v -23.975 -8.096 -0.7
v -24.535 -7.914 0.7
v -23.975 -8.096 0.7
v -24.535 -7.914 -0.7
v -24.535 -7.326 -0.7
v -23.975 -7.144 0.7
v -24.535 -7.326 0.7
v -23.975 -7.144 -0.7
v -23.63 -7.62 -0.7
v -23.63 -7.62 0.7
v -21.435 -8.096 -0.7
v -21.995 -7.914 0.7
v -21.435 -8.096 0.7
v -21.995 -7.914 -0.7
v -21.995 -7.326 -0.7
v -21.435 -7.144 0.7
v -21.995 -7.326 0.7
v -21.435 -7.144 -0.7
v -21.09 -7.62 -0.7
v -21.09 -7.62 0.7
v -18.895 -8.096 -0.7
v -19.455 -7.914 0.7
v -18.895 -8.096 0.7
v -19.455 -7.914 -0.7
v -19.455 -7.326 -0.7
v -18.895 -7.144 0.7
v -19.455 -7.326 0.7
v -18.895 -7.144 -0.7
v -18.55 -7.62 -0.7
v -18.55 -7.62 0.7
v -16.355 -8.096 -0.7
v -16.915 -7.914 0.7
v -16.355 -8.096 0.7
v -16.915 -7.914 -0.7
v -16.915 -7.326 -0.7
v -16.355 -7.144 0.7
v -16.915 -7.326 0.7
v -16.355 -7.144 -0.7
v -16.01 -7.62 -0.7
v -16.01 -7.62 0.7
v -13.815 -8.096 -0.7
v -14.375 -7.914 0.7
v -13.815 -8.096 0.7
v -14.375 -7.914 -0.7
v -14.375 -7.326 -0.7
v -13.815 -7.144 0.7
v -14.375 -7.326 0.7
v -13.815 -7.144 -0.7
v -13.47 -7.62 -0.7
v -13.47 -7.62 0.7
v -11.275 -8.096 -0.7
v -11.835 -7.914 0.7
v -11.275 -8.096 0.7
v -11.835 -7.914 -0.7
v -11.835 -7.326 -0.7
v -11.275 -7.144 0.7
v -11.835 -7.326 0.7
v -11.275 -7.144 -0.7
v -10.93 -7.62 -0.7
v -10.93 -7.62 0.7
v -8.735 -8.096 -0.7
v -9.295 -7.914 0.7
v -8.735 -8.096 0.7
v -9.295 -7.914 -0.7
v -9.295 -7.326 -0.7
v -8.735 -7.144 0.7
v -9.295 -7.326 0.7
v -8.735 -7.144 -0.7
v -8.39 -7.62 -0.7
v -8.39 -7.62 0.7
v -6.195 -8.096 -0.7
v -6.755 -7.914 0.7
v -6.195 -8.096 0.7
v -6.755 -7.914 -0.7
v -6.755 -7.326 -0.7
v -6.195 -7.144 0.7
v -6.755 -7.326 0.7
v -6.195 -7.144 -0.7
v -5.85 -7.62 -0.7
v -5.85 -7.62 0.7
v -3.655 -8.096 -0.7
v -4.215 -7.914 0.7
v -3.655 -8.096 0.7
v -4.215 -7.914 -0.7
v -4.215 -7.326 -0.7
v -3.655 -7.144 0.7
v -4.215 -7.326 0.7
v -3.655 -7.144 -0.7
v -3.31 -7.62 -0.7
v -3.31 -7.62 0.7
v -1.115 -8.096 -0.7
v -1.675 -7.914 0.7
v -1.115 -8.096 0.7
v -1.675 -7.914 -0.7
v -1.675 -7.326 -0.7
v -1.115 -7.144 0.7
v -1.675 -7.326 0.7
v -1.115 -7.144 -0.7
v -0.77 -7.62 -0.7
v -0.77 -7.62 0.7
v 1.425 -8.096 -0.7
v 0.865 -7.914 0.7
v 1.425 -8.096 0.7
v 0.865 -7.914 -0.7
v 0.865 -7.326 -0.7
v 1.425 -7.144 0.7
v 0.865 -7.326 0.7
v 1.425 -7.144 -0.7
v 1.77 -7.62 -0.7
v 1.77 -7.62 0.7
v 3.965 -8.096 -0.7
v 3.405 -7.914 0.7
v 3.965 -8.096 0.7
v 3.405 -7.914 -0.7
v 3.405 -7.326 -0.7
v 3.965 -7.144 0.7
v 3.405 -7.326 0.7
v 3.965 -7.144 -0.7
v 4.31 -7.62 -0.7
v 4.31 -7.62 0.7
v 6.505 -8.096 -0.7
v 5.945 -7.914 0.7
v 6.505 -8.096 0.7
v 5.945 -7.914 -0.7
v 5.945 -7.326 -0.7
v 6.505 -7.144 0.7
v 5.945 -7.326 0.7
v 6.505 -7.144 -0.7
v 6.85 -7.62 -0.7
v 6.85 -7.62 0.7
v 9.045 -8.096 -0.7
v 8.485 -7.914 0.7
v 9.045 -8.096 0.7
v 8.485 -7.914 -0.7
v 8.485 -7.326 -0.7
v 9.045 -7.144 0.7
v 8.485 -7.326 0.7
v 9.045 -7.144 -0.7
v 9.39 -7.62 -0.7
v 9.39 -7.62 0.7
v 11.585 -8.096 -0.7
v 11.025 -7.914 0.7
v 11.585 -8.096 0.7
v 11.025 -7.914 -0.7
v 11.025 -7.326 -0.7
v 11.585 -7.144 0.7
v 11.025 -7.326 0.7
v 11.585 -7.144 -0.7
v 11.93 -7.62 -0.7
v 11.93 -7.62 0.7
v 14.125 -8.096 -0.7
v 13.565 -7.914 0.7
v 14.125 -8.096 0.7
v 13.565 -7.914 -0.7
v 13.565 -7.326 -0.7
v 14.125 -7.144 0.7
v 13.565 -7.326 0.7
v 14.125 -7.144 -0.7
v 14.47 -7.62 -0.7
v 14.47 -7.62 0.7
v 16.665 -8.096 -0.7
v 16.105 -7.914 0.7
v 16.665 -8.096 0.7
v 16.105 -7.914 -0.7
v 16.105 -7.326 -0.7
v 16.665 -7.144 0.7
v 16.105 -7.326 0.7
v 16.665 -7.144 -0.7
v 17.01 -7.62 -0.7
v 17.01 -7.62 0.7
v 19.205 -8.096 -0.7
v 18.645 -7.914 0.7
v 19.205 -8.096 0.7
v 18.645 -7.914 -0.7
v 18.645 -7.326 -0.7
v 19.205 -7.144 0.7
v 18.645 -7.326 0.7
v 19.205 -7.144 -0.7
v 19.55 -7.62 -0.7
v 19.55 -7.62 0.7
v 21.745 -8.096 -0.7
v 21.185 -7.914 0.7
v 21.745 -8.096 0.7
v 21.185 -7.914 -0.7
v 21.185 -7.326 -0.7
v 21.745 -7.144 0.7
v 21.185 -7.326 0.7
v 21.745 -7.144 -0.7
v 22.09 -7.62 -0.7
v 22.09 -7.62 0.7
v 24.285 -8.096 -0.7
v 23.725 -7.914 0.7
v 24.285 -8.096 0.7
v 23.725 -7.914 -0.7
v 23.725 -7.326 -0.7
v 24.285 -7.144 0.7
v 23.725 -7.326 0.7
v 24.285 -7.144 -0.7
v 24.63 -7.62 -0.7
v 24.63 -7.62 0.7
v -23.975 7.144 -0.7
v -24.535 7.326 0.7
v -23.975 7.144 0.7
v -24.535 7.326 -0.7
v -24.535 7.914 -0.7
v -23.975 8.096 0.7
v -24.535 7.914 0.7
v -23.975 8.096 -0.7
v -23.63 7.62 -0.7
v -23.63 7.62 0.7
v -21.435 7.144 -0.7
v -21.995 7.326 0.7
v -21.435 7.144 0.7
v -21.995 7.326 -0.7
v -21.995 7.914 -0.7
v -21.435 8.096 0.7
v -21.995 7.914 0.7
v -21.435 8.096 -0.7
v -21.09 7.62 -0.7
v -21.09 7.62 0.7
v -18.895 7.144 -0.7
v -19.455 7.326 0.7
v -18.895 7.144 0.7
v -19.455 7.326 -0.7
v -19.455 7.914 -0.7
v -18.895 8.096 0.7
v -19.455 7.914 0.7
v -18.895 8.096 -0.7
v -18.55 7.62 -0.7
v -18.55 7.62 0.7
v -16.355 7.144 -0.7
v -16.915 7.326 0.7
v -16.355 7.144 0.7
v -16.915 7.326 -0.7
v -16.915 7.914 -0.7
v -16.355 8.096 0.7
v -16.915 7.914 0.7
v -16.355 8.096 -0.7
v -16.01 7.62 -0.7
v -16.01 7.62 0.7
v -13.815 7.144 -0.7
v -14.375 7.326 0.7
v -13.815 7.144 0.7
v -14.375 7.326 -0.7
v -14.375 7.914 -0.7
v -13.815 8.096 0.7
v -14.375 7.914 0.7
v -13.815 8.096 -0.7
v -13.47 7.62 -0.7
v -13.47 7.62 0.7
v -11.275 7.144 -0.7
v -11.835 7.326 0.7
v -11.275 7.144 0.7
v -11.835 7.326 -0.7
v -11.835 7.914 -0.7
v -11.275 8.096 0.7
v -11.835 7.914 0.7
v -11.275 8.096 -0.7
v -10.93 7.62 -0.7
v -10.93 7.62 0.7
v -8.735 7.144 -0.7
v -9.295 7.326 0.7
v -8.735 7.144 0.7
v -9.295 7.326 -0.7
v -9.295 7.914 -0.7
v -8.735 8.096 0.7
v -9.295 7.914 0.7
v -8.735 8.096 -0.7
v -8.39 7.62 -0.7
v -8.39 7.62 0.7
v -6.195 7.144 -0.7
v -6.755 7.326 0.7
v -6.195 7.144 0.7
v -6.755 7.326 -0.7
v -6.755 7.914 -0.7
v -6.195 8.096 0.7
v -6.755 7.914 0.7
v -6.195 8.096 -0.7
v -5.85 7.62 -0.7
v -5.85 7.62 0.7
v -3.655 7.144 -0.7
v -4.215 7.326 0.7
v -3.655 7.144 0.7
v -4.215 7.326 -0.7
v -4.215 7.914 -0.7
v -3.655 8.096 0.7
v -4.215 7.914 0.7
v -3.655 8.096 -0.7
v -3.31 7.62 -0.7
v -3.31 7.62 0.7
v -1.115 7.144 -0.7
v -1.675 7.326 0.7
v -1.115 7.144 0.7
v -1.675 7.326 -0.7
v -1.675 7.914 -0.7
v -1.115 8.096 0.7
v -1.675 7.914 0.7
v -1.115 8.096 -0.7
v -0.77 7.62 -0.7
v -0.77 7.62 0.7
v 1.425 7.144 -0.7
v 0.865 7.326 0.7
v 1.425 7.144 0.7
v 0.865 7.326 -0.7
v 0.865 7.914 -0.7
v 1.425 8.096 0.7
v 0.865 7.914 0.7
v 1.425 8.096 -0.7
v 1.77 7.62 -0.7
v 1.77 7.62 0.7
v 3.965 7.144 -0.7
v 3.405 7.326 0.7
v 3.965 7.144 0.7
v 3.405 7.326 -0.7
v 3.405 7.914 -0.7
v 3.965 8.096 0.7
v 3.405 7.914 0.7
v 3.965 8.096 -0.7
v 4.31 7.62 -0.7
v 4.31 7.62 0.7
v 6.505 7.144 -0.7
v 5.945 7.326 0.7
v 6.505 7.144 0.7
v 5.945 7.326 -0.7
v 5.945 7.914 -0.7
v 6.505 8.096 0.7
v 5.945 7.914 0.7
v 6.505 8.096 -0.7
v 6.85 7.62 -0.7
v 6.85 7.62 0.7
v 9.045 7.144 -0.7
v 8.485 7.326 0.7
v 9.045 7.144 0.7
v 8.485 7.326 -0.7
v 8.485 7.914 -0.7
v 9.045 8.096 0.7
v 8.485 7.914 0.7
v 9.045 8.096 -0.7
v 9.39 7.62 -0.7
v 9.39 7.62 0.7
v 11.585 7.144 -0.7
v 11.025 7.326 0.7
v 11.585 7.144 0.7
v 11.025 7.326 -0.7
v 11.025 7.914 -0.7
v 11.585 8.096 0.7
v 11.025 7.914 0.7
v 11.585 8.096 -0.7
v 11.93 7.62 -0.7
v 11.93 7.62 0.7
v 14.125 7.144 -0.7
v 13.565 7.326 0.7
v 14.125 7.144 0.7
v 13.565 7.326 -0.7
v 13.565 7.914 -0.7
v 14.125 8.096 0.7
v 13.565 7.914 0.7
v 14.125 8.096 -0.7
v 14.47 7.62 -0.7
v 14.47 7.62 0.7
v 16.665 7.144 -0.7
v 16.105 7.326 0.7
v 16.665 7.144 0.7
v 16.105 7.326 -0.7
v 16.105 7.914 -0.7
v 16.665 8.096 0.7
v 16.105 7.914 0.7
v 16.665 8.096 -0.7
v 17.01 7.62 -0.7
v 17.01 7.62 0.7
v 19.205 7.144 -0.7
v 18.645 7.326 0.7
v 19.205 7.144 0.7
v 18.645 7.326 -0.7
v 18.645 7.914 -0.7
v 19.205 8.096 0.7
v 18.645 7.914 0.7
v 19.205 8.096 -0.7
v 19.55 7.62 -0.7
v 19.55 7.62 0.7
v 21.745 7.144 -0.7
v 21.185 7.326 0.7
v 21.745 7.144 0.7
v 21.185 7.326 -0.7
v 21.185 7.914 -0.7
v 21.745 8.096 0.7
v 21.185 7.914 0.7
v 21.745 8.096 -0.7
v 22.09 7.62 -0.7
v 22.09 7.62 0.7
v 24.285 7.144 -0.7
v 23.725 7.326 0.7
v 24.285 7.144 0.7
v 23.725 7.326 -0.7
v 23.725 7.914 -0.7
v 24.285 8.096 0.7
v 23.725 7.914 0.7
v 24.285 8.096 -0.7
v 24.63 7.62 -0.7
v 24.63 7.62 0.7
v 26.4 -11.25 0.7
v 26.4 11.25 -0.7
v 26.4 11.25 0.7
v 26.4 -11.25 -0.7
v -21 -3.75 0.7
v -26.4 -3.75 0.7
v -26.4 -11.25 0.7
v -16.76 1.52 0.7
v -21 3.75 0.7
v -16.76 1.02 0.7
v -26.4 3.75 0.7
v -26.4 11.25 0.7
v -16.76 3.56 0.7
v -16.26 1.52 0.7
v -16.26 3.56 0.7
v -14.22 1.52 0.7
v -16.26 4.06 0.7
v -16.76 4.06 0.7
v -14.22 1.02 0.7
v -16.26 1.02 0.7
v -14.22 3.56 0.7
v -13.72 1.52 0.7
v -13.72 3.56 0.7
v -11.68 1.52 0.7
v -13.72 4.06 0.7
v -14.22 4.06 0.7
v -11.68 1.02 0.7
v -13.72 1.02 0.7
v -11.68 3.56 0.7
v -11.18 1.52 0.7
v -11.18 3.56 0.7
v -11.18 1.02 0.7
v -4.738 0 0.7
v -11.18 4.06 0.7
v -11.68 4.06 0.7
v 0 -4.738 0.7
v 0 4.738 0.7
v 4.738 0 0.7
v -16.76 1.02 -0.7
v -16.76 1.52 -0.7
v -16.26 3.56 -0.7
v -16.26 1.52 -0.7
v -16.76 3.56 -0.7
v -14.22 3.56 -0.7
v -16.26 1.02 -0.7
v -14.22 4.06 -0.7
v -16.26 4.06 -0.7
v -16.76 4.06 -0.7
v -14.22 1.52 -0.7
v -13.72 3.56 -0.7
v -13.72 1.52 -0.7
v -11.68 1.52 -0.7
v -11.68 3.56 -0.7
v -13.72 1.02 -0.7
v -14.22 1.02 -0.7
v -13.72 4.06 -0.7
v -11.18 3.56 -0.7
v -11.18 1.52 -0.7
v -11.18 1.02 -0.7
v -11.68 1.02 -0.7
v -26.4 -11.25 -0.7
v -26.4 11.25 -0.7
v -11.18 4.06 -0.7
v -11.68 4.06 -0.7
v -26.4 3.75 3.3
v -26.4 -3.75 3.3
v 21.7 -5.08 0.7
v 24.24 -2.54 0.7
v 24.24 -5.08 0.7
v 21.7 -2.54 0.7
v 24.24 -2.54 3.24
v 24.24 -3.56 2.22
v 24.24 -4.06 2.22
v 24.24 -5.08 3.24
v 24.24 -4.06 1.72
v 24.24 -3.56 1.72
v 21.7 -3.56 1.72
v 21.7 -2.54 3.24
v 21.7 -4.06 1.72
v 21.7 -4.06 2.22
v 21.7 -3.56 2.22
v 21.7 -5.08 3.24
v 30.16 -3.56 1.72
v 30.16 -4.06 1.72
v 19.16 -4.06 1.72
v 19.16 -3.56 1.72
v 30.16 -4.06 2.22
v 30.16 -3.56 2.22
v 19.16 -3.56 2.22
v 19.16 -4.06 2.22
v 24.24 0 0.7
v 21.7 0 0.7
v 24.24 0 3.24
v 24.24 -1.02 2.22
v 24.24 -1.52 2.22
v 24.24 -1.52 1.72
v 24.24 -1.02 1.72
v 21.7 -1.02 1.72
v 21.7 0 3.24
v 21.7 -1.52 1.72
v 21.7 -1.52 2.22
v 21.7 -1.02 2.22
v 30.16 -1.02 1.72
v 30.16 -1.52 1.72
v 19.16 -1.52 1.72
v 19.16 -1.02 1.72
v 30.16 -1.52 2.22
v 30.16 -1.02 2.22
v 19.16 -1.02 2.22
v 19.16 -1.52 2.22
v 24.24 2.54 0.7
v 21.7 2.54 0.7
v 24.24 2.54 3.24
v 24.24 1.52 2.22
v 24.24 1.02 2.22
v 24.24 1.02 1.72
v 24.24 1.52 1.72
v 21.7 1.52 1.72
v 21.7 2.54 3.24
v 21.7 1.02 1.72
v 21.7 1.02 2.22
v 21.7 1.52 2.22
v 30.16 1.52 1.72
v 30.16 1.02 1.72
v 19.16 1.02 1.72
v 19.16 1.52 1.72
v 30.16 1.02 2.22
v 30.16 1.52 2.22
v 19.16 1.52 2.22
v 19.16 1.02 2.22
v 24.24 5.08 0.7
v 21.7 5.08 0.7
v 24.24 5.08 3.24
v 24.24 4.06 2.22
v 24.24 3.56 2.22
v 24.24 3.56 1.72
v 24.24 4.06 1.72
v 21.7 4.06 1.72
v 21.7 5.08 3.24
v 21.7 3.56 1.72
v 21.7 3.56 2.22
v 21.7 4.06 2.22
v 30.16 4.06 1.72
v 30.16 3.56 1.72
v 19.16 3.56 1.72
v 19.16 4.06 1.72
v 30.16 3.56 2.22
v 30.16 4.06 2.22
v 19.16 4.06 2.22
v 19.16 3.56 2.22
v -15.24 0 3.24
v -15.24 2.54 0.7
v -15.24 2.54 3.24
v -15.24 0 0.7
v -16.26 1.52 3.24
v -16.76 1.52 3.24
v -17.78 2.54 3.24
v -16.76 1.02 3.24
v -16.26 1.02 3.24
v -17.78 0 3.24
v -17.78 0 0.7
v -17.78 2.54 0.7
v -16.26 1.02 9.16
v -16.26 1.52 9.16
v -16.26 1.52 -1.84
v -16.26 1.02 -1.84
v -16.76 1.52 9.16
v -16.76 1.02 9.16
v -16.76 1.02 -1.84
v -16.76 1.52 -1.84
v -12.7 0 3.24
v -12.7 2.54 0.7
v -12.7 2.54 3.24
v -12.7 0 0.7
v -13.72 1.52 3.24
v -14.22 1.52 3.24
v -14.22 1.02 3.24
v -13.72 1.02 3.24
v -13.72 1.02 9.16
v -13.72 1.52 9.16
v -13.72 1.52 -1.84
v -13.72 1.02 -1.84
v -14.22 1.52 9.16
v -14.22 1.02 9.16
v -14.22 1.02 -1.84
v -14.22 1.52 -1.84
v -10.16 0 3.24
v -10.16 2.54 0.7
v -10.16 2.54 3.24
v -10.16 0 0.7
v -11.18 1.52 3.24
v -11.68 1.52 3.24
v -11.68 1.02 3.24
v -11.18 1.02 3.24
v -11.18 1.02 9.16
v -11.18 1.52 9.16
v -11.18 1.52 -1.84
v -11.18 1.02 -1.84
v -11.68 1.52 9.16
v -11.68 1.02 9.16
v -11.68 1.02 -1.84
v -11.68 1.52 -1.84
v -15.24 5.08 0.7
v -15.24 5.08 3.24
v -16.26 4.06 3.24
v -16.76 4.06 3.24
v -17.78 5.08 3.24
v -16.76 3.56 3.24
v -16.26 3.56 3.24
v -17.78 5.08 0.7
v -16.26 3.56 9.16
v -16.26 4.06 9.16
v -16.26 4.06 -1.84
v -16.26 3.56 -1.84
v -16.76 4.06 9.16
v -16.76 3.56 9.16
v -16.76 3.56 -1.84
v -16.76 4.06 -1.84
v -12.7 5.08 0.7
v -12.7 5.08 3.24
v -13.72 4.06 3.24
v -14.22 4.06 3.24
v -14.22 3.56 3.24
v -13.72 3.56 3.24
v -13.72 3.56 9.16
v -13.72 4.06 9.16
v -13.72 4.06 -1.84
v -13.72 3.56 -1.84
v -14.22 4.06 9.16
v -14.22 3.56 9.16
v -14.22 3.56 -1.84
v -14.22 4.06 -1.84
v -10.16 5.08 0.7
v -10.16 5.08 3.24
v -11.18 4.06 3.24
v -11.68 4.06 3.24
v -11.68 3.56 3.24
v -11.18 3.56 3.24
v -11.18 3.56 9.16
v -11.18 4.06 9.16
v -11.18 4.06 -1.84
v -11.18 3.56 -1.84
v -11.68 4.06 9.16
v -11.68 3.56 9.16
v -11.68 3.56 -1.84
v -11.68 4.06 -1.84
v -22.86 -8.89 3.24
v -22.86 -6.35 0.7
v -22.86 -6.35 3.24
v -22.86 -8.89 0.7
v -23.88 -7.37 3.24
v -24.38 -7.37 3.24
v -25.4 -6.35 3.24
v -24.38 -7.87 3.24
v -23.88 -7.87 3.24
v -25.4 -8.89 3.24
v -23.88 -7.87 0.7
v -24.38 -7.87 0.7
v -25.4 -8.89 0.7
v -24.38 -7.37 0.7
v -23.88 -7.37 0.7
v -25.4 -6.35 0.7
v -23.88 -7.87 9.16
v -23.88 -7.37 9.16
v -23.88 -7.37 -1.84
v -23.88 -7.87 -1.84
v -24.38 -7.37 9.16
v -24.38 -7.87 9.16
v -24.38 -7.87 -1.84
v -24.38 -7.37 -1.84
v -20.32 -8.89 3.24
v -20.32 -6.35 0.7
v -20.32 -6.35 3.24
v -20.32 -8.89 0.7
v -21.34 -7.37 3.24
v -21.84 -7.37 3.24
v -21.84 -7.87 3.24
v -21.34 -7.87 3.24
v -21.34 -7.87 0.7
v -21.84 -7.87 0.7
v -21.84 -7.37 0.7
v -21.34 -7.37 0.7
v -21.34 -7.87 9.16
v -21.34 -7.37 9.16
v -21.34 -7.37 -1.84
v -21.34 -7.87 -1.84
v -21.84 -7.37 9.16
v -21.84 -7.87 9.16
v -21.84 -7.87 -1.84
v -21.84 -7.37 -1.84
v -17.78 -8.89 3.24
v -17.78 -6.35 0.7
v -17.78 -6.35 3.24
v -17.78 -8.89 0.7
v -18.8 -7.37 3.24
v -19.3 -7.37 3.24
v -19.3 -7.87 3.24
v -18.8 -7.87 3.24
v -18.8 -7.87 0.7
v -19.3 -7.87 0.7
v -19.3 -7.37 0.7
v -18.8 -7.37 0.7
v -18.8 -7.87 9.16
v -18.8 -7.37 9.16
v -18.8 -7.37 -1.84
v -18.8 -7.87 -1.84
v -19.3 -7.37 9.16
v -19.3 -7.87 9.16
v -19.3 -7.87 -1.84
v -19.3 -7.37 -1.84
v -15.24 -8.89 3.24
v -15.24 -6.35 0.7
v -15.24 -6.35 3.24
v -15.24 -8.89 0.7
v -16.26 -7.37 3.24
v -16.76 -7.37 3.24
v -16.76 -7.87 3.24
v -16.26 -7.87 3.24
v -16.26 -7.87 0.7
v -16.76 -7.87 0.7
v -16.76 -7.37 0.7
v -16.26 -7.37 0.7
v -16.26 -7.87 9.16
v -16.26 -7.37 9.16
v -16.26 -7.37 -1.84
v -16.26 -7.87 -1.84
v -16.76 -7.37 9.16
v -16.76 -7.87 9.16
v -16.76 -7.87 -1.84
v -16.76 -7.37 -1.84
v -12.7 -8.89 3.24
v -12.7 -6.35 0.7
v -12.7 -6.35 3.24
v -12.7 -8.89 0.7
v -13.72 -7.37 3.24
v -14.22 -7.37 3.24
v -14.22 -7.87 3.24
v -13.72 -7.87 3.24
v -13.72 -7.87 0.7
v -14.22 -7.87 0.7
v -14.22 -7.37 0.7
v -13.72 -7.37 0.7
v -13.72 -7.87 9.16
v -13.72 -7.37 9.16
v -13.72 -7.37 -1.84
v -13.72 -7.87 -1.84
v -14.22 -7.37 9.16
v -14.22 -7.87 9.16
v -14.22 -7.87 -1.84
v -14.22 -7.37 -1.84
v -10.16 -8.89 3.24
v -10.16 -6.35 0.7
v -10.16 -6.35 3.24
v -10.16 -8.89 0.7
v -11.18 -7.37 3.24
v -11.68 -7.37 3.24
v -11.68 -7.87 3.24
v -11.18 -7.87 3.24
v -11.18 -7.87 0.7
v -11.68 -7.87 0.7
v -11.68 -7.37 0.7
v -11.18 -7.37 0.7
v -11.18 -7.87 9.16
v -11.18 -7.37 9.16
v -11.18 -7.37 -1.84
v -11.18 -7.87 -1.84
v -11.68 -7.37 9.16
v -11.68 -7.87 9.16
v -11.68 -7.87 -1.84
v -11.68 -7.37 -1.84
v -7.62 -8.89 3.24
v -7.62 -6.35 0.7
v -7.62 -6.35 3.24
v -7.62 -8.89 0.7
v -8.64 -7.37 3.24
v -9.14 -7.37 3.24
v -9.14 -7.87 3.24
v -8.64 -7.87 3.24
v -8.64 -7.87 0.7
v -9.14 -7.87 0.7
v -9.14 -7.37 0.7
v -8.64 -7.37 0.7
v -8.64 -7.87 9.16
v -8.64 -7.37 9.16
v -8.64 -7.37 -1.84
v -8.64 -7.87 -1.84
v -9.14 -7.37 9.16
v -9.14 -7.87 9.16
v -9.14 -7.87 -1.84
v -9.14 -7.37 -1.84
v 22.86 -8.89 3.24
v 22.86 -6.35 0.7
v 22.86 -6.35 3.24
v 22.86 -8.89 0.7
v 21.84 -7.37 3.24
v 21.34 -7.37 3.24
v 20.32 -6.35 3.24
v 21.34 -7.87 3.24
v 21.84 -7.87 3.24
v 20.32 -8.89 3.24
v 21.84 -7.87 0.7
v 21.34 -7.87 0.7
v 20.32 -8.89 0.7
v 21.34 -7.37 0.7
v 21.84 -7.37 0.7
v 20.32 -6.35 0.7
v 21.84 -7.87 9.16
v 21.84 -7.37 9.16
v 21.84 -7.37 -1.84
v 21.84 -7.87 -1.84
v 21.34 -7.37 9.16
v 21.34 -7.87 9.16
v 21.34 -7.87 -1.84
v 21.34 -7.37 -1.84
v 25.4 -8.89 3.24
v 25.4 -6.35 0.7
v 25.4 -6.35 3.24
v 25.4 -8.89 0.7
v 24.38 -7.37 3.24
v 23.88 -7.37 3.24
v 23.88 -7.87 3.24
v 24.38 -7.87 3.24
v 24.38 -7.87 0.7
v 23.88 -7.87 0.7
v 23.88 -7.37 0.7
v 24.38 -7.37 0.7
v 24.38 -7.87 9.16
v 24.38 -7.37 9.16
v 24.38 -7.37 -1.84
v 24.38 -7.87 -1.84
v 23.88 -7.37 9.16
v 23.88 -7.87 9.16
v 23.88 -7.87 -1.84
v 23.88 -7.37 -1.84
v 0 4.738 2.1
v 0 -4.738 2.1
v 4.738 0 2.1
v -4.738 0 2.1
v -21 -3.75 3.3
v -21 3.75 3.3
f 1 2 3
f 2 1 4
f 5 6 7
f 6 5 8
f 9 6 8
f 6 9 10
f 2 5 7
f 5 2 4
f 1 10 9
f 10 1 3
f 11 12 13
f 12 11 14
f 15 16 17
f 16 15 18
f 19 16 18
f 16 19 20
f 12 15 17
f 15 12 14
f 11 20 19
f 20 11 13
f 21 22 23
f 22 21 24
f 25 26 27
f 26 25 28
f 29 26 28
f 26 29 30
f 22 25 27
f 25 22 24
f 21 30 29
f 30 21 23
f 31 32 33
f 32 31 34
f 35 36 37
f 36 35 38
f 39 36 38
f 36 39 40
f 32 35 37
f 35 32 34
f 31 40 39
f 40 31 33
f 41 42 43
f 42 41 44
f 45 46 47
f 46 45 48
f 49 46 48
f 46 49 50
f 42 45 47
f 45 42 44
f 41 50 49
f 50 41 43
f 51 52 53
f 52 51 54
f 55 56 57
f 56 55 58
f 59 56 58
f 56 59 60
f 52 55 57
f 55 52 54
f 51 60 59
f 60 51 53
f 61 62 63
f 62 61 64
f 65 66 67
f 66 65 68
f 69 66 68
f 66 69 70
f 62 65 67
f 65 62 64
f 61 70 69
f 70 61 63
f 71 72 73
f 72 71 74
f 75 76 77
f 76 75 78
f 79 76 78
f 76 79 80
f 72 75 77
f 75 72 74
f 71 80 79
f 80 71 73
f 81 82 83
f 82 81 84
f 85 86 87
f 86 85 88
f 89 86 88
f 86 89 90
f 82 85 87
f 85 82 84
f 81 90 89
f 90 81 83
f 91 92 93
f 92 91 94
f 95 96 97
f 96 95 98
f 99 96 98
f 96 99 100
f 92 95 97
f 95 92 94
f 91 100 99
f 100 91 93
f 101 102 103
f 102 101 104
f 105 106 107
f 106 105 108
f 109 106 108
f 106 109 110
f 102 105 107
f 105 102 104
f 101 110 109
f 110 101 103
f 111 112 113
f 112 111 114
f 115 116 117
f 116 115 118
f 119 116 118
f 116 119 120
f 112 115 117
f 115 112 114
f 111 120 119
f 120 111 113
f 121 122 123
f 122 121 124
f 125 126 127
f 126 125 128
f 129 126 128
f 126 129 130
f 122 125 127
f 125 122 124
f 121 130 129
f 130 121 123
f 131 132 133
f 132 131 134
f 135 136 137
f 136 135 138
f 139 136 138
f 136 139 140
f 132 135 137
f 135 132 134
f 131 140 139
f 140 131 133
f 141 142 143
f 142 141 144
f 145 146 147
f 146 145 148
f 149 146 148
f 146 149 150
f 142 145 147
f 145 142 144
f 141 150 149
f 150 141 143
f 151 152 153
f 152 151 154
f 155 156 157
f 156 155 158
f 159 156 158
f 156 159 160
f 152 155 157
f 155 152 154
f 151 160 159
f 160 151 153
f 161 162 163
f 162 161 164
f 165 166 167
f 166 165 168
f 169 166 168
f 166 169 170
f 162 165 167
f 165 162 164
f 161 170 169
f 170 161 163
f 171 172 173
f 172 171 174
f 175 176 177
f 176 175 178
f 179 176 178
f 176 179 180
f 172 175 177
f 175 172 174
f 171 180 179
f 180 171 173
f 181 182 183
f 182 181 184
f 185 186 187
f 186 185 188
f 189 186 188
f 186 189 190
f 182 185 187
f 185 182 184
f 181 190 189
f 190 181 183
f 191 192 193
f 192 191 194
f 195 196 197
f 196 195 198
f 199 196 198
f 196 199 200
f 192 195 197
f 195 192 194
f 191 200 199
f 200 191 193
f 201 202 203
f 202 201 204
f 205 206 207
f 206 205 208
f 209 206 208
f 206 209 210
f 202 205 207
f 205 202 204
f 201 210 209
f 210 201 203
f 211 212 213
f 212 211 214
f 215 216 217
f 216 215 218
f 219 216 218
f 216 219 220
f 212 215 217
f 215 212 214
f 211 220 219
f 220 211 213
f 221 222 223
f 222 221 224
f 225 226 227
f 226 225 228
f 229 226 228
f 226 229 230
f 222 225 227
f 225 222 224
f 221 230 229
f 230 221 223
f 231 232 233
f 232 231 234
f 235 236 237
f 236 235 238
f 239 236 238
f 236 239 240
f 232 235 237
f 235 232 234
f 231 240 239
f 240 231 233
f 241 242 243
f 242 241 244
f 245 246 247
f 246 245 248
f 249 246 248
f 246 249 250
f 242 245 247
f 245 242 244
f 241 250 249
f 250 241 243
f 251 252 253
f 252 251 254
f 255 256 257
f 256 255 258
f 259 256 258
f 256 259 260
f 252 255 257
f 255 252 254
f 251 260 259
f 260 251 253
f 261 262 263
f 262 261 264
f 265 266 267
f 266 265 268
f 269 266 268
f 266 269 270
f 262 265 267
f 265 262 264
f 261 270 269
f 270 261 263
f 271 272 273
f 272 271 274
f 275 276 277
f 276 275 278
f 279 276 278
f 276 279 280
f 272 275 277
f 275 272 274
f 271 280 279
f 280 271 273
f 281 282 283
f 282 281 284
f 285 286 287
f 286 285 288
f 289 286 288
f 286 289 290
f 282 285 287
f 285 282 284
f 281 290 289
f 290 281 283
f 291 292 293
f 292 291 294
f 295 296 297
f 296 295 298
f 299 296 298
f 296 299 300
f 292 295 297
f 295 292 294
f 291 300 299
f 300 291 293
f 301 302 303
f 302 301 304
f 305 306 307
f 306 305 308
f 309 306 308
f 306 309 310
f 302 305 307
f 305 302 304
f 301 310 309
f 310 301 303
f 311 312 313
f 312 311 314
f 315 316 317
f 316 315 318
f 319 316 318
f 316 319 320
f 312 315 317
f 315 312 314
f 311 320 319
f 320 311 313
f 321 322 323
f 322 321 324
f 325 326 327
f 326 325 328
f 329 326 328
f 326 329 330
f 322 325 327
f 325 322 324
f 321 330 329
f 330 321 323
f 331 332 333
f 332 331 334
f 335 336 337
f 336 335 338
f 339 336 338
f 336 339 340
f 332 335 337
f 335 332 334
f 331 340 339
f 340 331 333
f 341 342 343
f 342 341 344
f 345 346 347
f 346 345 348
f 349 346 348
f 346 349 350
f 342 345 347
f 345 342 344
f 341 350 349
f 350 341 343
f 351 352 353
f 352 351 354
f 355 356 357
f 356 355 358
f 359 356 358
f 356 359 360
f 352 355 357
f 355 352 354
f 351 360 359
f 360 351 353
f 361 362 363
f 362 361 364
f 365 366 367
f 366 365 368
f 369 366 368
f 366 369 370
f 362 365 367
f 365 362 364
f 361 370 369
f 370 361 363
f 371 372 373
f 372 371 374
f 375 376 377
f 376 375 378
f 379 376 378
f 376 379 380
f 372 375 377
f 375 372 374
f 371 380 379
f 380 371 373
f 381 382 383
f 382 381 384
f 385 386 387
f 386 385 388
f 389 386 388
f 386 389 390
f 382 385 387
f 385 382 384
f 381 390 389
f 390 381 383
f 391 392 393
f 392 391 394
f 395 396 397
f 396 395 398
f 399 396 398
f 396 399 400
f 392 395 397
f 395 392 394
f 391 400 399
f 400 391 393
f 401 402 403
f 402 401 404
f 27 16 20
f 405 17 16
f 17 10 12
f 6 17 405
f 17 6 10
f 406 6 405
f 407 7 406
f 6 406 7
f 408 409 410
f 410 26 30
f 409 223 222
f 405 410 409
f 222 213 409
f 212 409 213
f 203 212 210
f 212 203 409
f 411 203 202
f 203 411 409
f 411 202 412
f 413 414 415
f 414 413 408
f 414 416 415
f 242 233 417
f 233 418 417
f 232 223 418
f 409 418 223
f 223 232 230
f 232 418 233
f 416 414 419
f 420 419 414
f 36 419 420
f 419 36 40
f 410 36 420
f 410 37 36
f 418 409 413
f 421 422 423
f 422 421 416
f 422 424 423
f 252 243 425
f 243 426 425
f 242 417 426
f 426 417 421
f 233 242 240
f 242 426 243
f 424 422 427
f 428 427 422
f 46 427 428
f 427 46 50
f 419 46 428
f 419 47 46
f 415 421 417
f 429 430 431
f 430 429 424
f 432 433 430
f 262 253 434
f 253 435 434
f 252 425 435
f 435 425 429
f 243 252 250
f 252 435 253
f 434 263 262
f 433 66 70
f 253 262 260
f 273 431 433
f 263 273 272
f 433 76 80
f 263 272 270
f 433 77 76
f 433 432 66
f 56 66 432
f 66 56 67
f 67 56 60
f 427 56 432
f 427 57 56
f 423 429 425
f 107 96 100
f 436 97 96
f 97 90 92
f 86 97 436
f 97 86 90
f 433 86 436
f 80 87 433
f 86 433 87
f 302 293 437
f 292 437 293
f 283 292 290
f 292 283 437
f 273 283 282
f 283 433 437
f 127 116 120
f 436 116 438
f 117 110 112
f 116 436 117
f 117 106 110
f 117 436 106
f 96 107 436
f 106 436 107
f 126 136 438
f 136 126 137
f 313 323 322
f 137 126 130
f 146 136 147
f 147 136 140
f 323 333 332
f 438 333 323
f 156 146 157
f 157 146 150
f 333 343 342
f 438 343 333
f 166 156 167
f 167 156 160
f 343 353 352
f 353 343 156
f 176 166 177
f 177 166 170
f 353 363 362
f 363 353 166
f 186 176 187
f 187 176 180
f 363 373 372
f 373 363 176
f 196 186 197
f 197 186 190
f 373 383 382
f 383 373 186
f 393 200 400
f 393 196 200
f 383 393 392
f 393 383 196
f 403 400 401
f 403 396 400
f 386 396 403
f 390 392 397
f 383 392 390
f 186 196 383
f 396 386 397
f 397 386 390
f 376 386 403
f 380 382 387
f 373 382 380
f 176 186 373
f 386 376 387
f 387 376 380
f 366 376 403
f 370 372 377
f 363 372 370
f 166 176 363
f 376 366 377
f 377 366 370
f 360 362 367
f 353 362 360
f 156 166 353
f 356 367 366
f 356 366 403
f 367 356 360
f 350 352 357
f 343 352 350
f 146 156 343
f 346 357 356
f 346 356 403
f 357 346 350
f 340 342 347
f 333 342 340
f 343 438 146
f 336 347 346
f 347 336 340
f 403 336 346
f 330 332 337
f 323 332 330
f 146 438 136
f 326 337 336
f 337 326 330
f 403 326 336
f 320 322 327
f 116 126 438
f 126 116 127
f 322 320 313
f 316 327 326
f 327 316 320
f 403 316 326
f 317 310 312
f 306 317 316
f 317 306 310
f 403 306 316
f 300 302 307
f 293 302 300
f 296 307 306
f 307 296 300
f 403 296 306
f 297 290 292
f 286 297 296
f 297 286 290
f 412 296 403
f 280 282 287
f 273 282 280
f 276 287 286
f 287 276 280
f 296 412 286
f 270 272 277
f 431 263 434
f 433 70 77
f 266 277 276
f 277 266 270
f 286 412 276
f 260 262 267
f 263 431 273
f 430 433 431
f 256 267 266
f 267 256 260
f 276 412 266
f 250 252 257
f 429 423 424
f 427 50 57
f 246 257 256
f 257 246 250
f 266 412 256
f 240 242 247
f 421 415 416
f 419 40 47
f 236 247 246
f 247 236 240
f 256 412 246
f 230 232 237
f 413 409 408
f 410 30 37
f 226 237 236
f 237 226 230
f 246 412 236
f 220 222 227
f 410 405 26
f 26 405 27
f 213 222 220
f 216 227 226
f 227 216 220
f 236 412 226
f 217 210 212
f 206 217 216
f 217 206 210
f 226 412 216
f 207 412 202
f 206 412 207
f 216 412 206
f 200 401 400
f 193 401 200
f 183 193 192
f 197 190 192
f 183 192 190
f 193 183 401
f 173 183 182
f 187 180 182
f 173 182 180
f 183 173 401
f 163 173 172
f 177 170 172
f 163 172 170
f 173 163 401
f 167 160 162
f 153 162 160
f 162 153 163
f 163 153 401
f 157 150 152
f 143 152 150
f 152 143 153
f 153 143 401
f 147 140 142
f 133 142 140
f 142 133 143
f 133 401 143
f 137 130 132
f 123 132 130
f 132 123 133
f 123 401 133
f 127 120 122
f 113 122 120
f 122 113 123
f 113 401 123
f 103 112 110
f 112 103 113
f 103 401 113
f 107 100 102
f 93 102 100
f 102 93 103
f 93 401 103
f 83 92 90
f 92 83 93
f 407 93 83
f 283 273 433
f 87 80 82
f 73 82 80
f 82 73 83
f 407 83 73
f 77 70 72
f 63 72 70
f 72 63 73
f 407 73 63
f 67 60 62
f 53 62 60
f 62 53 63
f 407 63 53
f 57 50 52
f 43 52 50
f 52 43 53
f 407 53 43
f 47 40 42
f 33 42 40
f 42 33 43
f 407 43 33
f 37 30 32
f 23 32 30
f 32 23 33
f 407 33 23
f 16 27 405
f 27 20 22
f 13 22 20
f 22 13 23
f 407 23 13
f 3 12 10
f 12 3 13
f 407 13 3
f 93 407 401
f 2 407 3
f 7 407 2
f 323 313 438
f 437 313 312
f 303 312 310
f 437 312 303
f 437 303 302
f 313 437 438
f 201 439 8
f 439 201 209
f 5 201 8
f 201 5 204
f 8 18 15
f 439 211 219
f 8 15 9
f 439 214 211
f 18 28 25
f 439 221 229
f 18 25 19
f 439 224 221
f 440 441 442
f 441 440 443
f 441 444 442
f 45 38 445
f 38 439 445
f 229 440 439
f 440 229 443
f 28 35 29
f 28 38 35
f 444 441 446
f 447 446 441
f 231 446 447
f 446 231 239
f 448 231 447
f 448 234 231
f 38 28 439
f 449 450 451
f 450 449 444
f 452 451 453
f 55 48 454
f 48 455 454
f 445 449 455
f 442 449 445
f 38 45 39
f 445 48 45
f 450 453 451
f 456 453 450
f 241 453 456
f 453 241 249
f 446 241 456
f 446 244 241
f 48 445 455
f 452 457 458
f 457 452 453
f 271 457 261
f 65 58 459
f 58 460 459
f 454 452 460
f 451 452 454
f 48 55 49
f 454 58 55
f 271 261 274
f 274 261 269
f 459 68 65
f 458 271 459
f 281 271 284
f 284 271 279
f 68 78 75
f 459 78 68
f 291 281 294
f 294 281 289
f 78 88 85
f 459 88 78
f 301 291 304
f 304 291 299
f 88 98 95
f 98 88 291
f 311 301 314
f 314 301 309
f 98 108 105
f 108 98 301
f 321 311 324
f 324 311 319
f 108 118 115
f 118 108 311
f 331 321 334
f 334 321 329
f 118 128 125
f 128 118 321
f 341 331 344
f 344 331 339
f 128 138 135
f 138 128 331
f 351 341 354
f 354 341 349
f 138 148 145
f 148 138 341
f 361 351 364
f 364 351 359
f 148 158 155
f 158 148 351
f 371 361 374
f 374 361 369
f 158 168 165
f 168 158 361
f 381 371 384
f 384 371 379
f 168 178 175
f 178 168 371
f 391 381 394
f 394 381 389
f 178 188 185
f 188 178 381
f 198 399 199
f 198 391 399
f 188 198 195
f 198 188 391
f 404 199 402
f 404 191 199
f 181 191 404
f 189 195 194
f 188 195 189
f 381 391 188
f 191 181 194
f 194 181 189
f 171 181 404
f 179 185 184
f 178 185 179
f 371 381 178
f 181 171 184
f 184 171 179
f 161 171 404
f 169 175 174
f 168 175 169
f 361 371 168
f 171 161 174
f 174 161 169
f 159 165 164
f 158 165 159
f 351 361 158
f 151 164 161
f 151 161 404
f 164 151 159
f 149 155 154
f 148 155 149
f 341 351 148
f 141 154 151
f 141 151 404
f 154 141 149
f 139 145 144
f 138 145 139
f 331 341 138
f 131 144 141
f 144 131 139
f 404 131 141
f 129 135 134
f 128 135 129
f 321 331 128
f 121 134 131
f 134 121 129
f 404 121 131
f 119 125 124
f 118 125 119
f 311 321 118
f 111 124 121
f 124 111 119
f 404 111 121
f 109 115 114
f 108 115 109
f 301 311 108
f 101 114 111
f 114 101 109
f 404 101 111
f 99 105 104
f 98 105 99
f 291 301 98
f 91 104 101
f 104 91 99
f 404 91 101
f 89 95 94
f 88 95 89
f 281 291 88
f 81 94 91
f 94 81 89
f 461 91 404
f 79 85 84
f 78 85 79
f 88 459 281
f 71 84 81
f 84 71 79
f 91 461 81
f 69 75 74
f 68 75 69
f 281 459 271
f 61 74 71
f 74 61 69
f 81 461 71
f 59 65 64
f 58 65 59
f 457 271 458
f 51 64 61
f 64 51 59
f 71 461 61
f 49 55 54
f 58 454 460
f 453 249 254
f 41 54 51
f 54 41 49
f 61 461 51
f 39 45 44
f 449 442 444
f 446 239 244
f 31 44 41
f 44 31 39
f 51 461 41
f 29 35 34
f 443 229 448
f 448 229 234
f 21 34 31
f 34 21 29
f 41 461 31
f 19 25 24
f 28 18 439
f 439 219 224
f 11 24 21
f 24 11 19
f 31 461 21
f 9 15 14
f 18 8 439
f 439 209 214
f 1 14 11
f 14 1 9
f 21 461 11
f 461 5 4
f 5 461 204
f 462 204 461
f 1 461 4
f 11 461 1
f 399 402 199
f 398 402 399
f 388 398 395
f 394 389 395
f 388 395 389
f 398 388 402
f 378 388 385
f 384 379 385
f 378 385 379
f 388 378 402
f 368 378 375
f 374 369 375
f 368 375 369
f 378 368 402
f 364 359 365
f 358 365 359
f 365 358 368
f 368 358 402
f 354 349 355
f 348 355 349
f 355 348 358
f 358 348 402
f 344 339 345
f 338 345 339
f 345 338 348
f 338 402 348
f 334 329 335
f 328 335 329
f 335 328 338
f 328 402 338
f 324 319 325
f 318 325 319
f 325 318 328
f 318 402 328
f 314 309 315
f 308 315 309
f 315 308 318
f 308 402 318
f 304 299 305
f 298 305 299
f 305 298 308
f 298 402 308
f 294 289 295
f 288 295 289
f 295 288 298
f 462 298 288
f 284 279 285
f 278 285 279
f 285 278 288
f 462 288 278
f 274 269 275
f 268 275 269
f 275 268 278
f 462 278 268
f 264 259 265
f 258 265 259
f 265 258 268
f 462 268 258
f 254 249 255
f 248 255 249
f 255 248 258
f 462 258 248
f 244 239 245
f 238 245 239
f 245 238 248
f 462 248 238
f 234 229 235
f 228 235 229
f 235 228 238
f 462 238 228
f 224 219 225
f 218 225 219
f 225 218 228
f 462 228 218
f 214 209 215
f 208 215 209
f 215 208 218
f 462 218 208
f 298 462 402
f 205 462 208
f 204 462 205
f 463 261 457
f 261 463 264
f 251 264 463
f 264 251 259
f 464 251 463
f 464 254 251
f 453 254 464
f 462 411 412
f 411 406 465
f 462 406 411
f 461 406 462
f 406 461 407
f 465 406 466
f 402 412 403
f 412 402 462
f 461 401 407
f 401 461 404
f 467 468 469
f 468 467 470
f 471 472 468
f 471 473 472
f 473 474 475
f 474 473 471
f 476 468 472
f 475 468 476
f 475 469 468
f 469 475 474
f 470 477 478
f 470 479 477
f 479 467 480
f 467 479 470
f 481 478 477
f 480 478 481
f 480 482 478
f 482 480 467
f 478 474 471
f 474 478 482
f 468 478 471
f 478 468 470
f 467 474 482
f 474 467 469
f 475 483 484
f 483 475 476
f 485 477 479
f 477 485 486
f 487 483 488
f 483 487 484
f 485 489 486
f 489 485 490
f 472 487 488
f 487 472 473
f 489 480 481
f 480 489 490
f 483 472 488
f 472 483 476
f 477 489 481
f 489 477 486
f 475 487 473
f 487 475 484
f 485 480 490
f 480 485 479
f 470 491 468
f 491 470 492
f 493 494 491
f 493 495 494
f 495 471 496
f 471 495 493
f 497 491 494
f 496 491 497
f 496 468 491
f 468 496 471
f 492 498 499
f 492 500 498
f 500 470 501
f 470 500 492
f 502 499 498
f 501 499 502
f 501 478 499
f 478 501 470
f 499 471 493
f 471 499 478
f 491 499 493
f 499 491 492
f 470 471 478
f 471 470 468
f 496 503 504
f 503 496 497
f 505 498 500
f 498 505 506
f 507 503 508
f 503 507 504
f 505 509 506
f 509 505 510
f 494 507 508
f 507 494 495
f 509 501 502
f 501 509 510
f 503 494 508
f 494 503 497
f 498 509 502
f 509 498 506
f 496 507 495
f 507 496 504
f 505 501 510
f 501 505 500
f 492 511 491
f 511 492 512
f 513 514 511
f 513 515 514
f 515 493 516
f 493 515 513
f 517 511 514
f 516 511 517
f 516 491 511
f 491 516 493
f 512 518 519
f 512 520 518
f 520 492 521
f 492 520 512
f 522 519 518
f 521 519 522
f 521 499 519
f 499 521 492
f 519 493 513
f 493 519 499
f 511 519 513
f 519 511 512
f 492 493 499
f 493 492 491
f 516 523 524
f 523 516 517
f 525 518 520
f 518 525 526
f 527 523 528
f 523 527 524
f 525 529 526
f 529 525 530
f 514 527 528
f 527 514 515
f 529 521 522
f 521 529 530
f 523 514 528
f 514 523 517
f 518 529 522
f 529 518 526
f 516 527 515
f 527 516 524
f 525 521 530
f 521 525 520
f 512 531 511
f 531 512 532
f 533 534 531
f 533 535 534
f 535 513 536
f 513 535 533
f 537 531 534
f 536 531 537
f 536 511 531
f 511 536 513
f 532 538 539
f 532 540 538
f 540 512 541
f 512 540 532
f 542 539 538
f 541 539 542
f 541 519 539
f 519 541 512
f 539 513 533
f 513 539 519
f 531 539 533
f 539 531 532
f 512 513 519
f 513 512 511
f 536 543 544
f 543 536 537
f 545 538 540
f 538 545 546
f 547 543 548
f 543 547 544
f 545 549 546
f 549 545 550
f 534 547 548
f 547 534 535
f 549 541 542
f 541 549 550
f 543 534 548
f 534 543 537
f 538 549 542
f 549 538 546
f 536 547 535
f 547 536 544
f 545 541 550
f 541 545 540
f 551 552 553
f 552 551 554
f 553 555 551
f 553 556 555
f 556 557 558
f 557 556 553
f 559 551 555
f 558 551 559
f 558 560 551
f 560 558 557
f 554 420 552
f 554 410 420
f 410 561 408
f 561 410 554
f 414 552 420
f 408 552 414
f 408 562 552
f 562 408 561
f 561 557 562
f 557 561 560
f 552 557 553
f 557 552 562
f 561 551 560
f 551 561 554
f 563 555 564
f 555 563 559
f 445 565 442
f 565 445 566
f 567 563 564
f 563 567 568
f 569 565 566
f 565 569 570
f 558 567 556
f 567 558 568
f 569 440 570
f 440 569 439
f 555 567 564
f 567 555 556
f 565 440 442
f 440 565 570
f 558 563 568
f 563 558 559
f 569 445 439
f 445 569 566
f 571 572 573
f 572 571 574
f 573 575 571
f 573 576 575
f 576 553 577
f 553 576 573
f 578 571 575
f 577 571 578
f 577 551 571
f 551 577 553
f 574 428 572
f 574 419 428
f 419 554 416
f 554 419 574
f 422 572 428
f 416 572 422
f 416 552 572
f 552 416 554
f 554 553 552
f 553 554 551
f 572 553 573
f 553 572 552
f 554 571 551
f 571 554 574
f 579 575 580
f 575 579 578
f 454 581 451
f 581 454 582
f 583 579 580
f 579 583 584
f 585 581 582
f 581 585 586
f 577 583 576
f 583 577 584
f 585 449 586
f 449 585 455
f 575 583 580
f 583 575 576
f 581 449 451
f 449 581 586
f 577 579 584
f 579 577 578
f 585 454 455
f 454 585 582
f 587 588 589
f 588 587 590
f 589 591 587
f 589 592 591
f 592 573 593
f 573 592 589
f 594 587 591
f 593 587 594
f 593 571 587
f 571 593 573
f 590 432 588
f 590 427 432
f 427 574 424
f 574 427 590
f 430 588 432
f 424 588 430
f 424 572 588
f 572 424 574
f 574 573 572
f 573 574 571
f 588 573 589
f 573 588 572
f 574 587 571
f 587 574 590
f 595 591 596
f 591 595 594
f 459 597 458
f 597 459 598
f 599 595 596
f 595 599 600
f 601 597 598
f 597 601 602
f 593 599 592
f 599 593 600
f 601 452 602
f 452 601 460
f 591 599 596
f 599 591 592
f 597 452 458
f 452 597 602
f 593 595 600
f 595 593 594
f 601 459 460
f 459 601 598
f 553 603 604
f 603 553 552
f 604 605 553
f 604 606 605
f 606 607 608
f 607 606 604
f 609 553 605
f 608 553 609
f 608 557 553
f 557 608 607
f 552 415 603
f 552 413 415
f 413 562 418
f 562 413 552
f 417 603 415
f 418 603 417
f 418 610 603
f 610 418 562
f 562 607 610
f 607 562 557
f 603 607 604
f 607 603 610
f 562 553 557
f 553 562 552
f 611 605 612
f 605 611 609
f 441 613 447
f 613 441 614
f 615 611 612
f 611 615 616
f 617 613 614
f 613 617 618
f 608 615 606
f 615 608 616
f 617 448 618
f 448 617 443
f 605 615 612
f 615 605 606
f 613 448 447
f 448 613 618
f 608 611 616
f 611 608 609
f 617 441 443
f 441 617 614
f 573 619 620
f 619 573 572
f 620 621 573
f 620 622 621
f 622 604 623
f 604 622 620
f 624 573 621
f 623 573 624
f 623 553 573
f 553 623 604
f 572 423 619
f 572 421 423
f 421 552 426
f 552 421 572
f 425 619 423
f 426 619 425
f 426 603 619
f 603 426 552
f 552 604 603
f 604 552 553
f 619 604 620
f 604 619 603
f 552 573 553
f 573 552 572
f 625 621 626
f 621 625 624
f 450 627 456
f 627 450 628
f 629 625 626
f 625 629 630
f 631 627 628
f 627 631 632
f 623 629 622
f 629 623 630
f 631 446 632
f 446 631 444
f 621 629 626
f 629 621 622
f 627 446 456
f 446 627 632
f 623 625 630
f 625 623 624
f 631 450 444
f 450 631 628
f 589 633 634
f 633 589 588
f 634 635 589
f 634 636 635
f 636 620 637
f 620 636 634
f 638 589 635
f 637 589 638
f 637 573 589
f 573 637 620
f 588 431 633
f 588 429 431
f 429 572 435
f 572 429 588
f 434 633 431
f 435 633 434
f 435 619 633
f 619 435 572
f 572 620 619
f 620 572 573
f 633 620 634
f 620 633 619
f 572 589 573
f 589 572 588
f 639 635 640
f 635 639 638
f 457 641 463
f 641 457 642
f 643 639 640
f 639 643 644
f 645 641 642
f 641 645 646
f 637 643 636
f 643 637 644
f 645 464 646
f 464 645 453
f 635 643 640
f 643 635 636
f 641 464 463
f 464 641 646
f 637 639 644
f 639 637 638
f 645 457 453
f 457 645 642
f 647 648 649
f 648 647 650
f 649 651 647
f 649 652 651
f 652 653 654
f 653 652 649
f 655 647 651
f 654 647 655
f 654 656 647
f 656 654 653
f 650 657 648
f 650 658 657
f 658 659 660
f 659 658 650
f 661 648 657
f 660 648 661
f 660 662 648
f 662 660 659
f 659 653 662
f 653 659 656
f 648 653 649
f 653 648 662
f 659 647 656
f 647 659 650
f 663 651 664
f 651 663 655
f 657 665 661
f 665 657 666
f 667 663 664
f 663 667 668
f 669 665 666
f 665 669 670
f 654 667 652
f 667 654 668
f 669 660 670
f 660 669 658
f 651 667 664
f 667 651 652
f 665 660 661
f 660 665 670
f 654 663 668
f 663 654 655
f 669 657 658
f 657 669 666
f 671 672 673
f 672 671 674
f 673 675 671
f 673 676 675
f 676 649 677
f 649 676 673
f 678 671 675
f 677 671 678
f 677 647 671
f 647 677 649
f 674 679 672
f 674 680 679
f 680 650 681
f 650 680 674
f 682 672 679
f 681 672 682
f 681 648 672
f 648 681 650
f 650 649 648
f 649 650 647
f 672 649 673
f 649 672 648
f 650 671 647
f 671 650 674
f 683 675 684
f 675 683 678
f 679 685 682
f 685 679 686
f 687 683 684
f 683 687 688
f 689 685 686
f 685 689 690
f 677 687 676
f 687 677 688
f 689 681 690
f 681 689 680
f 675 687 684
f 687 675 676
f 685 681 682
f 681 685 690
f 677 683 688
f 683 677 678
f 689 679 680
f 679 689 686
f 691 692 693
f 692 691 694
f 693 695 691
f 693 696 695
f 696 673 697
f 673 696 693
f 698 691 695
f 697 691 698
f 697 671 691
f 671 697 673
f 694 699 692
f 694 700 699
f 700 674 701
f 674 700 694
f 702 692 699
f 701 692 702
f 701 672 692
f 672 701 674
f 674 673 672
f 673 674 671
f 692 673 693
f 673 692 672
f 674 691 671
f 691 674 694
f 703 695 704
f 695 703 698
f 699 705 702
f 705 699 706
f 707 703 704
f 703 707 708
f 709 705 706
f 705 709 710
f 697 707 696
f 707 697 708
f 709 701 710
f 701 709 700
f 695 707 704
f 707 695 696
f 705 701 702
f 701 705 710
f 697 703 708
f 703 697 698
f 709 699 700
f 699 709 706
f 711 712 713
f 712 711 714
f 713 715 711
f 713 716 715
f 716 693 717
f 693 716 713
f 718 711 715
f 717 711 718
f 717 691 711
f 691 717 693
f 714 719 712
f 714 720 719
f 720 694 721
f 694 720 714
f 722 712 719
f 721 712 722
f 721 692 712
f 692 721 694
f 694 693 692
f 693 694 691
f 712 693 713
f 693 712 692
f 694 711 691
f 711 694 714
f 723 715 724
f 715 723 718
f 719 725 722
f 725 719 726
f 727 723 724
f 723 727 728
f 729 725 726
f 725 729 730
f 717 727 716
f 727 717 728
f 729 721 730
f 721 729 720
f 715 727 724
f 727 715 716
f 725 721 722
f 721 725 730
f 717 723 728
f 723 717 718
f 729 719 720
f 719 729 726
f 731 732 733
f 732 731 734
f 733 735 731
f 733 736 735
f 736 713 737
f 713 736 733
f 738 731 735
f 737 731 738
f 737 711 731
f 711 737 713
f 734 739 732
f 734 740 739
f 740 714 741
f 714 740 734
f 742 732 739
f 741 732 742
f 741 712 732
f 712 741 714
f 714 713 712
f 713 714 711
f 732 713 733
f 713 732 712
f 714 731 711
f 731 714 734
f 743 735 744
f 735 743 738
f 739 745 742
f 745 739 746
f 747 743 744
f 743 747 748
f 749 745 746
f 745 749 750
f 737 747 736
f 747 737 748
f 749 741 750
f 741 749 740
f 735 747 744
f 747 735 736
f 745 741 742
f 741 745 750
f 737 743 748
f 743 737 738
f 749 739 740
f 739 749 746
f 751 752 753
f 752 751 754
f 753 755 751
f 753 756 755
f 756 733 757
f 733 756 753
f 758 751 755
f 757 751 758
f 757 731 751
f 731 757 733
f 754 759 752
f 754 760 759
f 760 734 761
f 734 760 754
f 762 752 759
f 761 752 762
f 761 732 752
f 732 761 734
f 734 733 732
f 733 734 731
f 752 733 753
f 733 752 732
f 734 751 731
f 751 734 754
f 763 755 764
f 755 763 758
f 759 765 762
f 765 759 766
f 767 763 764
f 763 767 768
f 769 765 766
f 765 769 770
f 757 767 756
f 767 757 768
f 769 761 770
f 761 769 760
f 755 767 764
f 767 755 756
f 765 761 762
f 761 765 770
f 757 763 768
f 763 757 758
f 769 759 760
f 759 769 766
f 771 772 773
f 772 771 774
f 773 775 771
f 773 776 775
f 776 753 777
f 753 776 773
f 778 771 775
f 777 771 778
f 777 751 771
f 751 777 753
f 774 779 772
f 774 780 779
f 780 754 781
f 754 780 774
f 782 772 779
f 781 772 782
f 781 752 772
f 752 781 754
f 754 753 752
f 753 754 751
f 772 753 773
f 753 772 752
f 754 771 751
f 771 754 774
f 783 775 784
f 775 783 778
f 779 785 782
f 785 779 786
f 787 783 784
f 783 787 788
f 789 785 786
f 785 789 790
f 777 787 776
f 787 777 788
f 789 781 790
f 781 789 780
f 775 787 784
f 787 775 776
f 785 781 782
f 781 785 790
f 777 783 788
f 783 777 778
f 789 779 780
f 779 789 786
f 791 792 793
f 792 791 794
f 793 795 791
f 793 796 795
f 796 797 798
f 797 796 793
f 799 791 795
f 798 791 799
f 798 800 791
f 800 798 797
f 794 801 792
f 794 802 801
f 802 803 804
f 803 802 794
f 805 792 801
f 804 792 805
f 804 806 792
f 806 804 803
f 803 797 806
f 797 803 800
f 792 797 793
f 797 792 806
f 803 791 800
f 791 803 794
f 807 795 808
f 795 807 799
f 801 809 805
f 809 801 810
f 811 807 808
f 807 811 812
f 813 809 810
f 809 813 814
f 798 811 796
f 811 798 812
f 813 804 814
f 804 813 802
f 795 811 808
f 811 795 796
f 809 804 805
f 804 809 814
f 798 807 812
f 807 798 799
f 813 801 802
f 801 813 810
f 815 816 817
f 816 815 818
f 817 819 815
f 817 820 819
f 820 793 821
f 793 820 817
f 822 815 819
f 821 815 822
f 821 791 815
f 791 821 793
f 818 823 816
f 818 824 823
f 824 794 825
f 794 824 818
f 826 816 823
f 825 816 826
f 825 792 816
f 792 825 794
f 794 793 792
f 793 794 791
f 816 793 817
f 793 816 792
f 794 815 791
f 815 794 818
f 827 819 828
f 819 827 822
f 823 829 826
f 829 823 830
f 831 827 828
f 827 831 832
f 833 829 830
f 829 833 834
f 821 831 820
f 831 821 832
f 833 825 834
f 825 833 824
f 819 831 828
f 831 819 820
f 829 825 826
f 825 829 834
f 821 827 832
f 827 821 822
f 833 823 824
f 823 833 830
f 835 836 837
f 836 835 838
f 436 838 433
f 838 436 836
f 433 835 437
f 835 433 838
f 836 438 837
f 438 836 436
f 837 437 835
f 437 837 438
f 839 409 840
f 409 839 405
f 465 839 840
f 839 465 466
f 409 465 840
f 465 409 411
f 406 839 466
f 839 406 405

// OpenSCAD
module pin() {
  pin = 2.54;

  // plastic cube
  color([0.2, 0.2, 0.2]) translate([0, 0, pin/2])
    cube([pin, pin, pin], center=true);

  // pin
  color([0.7, 0.7, 0.7]) translate([0, 0, 11/2 - pin])
    cube([0.5, 0.5, 11], center=true);  
}

module blue_pill() {
  width=52.8;
  height=22.5;
  depth=1.4;
  pin=2.54;

  difference() {
    // PCB
    color([0, 0, 0.6])
      cube([width, height, depth], center=true);

    // holes
    for (i = [-3, 3])
      for (j = [0:19])
        translate([-pin * 19 / 2 + j * pin, i * pin, 0])
          cylinder(d=1, h=2*depth, center=true);
  }

  // MCU
  color([0.2, 0.2, 0.2])
    rotate([0, 0, 45])
      translate([0, 0, depth])
        cube([6.7, 6.7, depth], center=true);

  // USB
  color([0.7, 0.7, 0.7])
    translate([-(width-5.4)/2, 0, 2.6/2+depth/2])
      cube([5.4, 7.5, 2.6], center=true);

  // debugger
  for (i = [-1.5:1.5])
    translate([width / 2 - 4.7, i * pin, depth/2 + pin/2])
      rotate([0,90,0])
        pin();

  // boot pins
  for (i=[0.5:1.5])
    for (j=[-6.5:-4.5])
      translate([j*pin, i*pin, depth/2])
        pin();

  // screen pins
  for (i=[0,1,2,3,4,5,6,18,19])
    translate([(-19/2 + i)*pin, -3*pin, depth/2])
      pin();
}

blue_pill();
